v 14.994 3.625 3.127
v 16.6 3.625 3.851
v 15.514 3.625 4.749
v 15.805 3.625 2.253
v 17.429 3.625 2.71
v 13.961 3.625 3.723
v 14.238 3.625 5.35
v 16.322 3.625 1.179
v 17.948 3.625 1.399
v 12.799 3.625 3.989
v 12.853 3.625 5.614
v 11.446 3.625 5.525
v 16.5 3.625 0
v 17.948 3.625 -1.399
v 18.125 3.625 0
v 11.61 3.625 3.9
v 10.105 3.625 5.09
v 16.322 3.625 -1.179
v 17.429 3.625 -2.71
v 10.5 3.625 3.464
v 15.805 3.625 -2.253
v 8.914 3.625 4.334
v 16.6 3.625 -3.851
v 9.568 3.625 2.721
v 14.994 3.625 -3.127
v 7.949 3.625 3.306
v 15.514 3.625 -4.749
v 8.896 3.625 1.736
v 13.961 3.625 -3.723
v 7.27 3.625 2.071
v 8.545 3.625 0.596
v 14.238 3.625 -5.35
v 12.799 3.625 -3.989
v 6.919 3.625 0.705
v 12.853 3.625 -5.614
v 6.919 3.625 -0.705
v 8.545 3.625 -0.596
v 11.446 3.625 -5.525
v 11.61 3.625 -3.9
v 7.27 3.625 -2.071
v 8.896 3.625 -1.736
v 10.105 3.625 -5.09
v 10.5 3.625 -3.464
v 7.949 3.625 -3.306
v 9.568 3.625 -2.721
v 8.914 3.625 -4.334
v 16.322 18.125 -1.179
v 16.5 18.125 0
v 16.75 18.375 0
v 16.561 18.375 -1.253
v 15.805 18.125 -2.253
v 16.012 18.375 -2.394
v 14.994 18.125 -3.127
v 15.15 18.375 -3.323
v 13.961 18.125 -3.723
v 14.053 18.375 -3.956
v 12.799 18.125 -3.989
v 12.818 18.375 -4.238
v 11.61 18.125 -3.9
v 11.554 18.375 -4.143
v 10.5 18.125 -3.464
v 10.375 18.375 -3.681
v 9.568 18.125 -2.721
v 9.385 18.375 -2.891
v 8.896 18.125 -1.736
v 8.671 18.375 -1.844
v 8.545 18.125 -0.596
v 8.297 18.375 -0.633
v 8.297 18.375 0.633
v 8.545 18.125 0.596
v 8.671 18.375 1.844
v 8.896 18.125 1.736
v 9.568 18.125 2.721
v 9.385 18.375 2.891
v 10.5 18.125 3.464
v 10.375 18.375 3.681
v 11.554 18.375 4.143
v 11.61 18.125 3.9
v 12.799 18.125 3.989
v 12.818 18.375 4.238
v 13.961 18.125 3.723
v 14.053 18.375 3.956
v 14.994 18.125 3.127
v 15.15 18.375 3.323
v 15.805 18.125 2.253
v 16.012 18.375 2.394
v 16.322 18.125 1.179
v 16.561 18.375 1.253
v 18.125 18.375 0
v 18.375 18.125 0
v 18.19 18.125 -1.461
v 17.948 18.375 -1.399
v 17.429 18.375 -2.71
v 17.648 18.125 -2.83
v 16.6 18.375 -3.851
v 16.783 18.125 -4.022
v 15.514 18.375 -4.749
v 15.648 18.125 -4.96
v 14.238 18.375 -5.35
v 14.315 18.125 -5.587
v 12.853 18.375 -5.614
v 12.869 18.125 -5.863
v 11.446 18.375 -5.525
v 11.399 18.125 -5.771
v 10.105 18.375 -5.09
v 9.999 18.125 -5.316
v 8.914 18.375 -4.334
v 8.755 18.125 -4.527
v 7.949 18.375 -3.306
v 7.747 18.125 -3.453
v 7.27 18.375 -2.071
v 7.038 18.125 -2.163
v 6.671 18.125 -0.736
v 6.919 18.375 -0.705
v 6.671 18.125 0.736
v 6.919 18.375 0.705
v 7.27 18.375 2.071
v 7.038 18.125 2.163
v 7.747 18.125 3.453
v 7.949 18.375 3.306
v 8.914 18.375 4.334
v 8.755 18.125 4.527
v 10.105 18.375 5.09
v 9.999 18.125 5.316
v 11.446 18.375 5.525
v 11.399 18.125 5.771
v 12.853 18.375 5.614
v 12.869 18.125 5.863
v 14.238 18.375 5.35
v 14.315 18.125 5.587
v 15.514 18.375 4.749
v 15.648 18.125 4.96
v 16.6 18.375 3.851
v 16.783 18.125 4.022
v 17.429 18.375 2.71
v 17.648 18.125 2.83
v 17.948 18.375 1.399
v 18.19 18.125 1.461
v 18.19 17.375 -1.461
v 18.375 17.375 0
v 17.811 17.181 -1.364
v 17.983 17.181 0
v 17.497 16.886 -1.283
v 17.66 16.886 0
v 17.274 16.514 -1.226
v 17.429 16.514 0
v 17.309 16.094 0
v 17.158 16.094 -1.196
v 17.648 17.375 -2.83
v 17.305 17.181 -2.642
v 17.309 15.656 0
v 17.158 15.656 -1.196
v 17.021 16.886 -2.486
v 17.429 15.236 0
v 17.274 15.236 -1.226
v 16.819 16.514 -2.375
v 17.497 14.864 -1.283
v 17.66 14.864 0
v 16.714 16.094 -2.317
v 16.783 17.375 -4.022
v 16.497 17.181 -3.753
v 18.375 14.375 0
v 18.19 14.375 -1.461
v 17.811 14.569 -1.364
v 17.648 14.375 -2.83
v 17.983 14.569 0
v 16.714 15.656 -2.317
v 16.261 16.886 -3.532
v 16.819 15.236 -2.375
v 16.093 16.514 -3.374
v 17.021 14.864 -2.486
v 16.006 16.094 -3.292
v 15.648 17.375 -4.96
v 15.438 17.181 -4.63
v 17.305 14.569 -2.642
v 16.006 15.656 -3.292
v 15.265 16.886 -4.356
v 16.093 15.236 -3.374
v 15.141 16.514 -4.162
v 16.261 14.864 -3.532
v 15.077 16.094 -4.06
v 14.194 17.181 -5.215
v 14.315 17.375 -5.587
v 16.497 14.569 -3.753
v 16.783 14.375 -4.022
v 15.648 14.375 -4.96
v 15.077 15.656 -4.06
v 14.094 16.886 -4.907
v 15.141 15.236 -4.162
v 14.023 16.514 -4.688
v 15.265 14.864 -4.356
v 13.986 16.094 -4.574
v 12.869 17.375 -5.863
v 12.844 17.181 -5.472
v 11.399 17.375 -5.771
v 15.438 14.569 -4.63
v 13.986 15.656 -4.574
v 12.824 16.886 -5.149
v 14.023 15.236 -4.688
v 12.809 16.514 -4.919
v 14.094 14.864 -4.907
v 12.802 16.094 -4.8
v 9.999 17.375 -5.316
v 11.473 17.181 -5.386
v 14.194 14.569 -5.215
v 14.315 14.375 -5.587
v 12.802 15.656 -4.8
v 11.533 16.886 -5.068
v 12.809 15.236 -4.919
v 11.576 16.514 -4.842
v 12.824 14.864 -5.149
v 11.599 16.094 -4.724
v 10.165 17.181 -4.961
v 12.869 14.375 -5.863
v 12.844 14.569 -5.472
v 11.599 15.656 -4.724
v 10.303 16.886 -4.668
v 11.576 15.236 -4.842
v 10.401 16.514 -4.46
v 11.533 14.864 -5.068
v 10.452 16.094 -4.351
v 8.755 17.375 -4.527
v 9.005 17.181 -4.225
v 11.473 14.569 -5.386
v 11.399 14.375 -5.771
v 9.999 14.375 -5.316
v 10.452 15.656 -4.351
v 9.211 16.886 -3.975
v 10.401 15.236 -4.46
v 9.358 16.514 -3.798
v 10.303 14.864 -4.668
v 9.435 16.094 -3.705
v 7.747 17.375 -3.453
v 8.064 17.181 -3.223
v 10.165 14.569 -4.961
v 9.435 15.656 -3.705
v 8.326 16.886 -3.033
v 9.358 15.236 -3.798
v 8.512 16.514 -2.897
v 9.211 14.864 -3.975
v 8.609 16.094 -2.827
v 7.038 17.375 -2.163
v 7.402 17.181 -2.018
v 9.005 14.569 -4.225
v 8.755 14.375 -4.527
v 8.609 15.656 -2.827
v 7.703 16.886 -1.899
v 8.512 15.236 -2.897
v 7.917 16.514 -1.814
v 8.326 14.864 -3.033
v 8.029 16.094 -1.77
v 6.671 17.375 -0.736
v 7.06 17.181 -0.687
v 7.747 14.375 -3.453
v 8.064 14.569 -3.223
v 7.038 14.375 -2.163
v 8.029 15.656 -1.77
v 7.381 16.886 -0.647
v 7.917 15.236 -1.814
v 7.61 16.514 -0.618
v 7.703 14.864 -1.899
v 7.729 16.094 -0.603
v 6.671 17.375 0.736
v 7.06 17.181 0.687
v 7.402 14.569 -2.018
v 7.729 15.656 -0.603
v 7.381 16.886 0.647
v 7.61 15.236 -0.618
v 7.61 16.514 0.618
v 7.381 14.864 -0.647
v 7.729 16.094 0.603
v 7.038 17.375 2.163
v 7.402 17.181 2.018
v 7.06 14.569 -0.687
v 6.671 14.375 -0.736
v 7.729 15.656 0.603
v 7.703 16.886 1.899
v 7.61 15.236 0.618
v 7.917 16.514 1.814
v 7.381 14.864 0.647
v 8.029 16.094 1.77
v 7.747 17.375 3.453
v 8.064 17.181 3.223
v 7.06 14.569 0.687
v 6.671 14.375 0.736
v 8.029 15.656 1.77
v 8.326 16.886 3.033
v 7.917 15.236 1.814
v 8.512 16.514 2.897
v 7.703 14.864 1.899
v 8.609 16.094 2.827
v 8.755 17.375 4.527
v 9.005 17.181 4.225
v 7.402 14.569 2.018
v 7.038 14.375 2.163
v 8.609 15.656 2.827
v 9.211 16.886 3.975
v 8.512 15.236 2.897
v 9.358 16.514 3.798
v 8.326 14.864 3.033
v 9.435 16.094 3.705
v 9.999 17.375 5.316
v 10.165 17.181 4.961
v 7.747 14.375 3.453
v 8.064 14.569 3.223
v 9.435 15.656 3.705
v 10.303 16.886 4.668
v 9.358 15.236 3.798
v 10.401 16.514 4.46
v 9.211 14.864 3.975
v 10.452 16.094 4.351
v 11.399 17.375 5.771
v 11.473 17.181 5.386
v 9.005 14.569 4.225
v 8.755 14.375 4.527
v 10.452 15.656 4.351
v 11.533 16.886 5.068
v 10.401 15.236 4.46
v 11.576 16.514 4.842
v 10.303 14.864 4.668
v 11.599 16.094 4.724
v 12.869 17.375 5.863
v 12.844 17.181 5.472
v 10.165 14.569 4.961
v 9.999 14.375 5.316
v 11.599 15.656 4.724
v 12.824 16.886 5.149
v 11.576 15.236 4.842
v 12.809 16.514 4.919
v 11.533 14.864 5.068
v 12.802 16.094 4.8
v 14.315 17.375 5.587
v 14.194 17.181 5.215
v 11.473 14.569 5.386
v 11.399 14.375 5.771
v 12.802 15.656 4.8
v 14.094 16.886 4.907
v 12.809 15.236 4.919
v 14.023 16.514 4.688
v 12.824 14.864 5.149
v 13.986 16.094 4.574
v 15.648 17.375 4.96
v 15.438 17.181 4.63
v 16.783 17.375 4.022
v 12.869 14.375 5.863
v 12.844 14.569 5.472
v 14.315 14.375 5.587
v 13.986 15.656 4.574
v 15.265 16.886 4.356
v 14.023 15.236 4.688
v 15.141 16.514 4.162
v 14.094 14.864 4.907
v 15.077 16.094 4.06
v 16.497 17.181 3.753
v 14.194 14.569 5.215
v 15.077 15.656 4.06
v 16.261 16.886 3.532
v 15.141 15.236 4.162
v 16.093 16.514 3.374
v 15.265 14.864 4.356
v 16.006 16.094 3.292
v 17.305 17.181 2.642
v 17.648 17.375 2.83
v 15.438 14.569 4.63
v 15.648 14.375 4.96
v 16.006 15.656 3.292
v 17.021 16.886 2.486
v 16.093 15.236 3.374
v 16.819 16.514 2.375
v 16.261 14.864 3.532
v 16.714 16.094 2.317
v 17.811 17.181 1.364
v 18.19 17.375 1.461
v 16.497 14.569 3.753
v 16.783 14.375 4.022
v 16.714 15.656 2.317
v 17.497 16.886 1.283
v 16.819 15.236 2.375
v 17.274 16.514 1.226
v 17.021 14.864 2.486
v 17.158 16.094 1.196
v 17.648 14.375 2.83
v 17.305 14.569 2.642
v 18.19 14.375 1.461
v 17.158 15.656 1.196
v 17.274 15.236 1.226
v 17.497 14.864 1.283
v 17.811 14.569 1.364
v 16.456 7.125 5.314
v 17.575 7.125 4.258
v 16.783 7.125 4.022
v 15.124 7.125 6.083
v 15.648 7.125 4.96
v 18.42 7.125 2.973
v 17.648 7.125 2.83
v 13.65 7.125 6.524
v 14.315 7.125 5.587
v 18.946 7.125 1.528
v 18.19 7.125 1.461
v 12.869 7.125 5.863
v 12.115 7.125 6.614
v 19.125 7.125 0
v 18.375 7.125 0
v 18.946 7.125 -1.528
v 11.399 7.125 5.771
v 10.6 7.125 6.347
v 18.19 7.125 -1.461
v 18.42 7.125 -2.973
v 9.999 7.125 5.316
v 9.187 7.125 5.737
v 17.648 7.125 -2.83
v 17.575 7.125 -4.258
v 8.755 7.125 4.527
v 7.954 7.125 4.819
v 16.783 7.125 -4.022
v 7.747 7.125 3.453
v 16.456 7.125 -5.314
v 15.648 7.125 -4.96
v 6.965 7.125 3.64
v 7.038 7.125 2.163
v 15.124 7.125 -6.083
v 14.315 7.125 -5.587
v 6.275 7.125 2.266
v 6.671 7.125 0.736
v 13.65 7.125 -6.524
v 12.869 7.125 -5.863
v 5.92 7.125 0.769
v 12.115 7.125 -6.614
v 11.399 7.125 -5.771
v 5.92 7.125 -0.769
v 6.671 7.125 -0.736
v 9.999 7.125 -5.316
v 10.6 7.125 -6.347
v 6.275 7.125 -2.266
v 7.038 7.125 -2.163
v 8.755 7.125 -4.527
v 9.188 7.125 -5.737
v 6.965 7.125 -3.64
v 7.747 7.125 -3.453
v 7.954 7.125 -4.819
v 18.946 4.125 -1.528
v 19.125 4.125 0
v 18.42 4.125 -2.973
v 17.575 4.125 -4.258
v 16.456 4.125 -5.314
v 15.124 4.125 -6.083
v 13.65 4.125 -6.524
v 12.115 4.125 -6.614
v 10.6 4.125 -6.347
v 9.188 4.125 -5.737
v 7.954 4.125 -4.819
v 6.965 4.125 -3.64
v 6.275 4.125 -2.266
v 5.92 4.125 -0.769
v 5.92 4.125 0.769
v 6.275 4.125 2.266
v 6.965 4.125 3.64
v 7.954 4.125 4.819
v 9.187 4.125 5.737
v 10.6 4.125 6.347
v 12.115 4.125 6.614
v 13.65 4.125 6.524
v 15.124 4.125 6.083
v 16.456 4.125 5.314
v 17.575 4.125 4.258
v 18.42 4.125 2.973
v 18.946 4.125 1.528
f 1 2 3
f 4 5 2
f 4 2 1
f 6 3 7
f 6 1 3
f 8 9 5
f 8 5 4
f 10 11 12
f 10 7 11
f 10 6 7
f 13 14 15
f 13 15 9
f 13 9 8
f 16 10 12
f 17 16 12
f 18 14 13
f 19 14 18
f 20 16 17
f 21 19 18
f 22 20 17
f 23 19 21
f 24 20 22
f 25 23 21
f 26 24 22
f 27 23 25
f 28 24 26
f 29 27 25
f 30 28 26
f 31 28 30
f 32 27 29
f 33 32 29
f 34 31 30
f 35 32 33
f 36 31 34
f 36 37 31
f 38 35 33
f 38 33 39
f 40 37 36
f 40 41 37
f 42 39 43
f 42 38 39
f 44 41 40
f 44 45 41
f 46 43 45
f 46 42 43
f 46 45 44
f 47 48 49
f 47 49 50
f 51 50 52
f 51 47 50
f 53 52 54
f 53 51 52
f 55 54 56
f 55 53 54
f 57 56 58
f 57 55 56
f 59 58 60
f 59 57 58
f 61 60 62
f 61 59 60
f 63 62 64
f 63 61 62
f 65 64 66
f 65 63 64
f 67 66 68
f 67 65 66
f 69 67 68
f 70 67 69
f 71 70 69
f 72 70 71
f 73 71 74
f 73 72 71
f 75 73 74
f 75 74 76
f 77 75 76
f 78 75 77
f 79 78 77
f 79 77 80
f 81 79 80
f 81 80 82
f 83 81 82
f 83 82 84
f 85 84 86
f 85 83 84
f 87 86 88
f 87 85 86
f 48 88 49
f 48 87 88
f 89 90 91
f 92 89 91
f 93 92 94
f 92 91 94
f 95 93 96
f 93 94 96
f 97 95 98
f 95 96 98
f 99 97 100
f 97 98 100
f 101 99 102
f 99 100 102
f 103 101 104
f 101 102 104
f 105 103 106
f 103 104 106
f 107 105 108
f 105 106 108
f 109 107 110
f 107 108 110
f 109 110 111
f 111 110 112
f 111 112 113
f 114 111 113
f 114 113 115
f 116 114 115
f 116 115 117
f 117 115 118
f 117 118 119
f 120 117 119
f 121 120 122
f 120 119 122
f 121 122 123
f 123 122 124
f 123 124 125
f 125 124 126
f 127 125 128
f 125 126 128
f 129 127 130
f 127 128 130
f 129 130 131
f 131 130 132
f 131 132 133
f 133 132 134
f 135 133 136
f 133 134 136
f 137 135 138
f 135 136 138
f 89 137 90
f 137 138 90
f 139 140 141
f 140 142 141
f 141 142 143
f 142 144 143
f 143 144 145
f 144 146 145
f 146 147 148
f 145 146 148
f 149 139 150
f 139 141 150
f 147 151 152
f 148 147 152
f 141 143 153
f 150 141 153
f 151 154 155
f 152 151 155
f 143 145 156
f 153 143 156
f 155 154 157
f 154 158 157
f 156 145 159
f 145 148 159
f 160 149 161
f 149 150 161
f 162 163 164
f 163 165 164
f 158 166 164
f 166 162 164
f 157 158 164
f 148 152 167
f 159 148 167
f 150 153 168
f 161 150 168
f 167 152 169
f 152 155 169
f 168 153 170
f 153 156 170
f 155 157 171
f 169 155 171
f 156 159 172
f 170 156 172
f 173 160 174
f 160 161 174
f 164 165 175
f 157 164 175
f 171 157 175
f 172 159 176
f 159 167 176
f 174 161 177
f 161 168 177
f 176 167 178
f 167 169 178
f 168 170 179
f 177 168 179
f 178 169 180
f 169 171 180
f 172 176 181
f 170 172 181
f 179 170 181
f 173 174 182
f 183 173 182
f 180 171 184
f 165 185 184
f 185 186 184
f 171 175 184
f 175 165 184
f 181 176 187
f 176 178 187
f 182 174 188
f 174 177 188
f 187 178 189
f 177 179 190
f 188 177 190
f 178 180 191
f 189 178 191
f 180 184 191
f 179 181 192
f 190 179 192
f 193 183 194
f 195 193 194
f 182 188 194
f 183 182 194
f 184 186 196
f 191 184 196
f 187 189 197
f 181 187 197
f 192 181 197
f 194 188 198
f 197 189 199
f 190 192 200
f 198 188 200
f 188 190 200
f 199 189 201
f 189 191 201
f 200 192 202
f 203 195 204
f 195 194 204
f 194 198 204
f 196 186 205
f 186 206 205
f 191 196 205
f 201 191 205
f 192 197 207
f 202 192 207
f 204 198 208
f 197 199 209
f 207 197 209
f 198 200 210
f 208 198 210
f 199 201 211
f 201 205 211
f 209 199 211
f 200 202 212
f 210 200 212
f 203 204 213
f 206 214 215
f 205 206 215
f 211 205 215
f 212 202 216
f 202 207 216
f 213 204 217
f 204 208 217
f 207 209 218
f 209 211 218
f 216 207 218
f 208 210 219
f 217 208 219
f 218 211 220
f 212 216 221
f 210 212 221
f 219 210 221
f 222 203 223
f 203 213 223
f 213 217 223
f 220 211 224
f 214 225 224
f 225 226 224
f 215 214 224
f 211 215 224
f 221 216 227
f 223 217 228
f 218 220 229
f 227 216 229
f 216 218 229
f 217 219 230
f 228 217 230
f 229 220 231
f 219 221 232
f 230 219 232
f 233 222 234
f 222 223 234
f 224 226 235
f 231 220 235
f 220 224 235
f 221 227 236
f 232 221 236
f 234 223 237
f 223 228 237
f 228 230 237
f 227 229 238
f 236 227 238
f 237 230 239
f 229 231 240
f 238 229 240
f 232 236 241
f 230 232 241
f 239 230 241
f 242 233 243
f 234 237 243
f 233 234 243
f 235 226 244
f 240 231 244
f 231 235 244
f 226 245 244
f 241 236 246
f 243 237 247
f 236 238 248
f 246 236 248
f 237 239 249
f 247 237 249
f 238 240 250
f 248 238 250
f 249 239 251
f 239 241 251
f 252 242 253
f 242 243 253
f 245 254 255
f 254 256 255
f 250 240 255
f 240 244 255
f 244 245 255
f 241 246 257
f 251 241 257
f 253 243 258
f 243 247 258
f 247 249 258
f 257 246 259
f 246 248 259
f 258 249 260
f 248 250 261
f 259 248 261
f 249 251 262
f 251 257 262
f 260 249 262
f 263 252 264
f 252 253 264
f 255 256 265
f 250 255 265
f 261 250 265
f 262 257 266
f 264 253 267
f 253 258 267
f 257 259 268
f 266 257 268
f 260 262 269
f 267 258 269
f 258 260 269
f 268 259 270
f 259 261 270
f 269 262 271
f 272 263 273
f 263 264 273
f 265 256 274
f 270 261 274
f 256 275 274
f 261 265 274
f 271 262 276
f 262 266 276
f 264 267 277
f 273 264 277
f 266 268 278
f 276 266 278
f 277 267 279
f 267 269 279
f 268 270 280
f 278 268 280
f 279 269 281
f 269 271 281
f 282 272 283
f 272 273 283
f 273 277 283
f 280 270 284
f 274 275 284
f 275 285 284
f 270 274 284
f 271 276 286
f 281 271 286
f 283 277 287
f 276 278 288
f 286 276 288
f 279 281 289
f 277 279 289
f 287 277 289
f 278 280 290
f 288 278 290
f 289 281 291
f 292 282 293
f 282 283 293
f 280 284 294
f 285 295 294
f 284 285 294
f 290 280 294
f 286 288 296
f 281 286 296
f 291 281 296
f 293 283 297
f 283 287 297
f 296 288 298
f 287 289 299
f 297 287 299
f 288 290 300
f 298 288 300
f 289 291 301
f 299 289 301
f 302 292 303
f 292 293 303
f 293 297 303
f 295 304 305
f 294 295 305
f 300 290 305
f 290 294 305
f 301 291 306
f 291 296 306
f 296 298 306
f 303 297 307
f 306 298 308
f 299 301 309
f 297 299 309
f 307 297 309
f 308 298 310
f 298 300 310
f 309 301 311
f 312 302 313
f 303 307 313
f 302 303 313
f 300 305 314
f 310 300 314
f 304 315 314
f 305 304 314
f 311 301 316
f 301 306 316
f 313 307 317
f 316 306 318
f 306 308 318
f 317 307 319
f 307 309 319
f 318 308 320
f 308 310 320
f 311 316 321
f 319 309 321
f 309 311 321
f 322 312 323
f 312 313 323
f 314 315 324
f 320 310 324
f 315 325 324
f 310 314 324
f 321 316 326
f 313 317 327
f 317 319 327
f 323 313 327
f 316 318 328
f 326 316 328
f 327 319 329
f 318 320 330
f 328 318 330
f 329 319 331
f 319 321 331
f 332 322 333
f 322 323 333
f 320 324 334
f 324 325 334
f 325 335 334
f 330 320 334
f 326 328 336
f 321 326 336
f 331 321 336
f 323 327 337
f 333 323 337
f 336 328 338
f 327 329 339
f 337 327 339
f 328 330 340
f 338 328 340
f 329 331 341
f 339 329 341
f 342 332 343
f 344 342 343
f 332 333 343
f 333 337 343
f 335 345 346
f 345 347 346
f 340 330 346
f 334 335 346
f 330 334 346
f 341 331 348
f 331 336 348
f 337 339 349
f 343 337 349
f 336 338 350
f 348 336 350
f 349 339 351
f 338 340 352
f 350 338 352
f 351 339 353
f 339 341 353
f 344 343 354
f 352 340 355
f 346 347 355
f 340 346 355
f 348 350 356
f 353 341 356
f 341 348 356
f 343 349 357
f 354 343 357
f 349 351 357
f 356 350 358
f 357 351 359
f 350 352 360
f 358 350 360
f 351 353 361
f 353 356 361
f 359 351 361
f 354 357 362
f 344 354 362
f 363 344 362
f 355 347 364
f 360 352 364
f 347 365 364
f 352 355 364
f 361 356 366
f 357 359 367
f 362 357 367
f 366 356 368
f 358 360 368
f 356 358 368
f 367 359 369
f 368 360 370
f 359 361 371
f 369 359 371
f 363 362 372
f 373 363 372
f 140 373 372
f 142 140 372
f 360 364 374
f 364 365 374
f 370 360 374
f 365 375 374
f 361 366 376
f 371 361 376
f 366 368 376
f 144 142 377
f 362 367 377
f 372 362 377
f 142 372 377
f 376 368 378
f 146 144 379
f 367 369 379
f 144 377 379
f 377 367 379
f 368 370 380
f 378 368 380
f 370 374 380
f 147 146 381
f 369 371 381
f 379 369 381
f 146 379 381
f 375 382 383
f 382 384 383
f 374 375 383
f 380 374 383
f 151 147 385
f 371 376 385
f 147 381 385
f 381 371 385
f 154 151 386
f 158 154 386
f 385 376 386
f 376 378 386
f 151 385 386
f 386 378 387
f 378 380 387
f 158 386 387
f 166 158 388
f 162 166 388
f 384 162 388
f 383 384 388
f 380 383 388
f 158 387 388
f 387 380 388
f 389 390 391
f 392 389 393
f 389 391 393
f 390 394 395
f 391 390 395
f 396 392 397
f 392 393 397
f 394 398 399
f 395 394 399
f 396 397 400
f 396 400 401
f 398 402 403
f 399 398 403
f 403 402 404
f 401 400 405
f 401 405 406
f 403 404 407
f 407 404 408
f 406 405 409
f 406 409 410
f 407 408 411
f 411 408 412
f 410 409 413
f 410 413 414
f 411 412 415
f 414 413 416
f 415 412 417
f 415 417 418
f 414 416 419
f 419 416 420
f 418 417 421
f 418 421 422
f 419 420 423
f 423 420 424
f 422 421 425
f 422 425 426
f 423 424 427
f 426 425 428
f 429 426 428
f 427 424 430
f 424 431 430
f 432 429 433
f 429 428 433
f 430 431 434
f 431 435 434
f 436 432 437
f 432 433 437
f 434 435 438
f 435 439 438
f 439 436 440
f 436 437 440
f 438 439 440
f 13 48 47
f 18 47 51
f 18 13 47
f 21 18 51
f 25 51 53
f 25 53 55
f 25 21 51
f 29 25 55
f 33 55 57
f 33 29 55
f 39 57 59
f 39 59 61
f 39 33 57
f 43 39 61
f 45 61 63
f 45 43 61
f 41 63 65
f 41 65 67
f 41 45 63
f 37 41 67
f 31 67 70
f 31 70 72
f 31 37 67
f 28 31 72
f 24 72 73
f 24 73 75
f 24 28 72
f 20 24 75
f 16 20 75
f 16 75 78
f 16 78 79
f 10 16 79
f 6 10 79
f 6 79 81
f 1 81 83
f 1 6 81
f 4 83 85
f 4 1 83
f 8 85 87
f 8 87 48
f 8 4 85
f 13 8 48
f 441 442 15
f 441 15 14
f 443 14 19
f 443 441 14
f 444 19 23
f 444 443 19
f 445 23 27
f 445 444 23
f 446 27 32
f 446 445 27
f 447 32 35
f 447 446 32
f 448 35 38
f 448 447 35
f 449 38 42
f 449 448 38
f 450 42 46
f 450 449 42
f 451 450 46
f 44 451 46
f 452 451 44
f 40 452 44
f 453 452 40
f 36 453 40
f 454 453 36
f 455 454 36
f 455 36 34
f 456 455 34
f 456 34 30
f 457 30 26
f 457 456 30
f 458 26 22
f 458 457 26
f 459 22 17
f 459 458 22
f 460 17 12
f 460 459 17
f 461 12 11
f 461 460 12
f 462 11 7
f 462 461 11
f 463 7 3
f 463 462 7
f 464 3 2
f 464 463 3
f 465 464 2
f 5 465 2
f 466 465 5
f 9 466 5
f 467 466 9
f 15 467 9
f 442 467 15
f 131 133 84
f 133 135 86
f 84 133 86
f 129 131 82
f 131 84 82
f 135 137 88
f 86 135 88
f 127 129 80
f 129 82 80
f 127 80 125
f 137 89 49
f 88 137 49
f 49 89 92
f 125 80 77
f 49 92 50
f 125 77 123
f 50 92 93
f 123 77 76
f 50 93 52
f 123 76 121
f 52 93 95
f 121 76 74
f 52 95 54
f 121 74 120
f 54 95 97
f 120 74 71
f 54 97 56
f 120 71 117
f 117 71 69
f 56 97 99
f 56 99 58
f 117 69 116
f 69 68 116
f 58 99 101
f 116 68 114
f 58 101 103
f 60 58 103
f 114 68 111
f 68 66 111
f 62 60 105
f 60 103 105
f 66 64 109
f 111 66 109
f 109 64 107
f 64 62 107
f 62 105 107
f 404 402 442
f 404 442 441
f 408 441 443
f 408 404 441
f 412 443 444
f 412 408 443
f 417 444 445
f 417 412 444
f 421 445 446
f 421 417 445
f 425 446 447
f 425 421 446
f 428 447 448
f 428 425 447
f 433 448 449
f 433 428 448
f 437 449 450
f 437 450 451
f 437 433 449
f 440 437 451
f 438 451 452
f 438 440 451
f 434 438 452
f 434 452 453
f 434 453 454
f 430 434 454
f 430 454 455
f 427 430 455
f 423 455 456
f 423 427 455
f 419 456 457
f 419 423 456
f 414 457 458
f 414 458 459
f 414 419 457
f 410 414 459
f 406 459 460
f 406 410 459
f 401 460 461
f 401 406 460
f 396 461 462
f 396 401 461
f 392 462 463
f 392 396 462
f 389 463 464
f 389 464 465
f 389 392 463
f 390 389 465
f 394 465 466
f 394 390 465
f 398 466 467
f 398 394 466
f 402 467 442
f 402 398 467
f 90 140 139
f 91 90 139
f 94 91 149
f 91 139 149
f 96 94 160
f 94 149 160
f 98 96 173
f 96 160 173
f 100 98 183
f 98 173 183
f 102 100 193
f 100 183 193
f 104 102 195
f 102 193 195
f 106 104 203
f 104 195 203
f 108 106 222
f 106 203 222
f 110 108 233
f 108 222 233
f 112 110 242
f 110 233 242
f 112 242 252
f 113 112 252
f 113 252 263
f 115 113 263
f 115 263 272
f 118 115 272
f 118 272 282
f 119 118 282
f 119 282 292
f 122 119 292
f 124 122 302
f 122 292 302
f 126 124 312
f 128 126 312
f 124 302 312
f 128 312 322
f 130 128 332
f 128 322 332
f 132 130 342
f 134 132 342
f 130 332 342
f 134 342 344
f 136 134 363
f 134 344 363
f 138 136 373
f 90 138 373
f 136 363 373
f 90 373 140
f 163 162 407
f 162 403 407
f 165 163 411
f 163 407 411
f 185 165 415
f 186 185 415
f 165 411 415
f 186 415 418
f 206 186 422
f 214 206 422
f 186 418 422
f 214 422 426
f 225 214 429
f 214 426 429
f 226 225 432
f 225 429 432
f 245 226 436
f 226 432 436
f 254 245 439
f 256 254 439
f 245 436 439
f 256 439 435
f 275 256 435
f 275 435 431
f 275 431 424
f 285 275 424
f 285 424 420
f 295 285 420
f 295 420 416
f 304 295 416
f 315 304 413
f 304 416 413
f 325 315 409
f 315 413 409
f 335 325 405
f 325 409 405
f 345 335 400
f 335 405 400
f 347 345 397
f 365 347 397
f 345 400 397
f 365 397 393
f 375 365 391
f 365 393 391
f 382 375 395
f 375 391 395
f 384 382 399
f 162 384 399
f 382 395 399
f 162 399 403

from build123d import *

# Parameters (mm, degrees)
CHAMFER003_SIZE  = 0.25
CHAMFER004_SIZE2 = 0.5
CHAMFER004_SIZE  = 1


with BuildPart() as part:
    # Sketch007 → Revolution (revolve)
    with BuildSketch(Plane.XY):
        with BuildLine():
            Line((4, 18.375), (5.875, 18.375))
            Line((5.875, 18.375), (5.875, 17.375))
            ThreePointArc((5.875, 17.375), (4.7938611699, 15.875), (5.875, 14.375))
            Line((5.875, 14.375), (5.875, 7.125))
            Line((5.875, 7.125), (6.625, 7.125))
            Line((6.625, 3.625), (6.625, 7.125))
            Line((4, 3.625), (6.625, 3.625))
            Line((4, 18.375), (4, 3.625))
        make_face()
    revolve(axis=Axis((0, 0, 0), (0, 1, 0)))

    # Chamfer003
    chamfer003_edges = [part.edges().sort_by_distance(p)[0] for p in [
        (-4, 18.375, 0),
        (-5.875, 18.375, 0),
    ]]
    chamfer(chamfer003_edges, length=CHAMFER003_SIZE)

    # Chamfer004
    chamfer004_edges = [part.edges().sort_by_distance(p)[0] for p in [
        (-6.625, 3.625, 0),
    ]]
    chamfer004_side = part.faces().sort_by_distance((-4.187383, 3.625, 0))[0]
    chamfer(chamfer004_edges, length=CHAMFER004_SIZE, length2=CHAMFER004_SIZE2, reference=chamfer004_side)


with BuildPart() as part_1:
    # Body006 placement: moved
    add(part.part.moved(Location((12.5, 0, 0))))


solid = part_1.part
